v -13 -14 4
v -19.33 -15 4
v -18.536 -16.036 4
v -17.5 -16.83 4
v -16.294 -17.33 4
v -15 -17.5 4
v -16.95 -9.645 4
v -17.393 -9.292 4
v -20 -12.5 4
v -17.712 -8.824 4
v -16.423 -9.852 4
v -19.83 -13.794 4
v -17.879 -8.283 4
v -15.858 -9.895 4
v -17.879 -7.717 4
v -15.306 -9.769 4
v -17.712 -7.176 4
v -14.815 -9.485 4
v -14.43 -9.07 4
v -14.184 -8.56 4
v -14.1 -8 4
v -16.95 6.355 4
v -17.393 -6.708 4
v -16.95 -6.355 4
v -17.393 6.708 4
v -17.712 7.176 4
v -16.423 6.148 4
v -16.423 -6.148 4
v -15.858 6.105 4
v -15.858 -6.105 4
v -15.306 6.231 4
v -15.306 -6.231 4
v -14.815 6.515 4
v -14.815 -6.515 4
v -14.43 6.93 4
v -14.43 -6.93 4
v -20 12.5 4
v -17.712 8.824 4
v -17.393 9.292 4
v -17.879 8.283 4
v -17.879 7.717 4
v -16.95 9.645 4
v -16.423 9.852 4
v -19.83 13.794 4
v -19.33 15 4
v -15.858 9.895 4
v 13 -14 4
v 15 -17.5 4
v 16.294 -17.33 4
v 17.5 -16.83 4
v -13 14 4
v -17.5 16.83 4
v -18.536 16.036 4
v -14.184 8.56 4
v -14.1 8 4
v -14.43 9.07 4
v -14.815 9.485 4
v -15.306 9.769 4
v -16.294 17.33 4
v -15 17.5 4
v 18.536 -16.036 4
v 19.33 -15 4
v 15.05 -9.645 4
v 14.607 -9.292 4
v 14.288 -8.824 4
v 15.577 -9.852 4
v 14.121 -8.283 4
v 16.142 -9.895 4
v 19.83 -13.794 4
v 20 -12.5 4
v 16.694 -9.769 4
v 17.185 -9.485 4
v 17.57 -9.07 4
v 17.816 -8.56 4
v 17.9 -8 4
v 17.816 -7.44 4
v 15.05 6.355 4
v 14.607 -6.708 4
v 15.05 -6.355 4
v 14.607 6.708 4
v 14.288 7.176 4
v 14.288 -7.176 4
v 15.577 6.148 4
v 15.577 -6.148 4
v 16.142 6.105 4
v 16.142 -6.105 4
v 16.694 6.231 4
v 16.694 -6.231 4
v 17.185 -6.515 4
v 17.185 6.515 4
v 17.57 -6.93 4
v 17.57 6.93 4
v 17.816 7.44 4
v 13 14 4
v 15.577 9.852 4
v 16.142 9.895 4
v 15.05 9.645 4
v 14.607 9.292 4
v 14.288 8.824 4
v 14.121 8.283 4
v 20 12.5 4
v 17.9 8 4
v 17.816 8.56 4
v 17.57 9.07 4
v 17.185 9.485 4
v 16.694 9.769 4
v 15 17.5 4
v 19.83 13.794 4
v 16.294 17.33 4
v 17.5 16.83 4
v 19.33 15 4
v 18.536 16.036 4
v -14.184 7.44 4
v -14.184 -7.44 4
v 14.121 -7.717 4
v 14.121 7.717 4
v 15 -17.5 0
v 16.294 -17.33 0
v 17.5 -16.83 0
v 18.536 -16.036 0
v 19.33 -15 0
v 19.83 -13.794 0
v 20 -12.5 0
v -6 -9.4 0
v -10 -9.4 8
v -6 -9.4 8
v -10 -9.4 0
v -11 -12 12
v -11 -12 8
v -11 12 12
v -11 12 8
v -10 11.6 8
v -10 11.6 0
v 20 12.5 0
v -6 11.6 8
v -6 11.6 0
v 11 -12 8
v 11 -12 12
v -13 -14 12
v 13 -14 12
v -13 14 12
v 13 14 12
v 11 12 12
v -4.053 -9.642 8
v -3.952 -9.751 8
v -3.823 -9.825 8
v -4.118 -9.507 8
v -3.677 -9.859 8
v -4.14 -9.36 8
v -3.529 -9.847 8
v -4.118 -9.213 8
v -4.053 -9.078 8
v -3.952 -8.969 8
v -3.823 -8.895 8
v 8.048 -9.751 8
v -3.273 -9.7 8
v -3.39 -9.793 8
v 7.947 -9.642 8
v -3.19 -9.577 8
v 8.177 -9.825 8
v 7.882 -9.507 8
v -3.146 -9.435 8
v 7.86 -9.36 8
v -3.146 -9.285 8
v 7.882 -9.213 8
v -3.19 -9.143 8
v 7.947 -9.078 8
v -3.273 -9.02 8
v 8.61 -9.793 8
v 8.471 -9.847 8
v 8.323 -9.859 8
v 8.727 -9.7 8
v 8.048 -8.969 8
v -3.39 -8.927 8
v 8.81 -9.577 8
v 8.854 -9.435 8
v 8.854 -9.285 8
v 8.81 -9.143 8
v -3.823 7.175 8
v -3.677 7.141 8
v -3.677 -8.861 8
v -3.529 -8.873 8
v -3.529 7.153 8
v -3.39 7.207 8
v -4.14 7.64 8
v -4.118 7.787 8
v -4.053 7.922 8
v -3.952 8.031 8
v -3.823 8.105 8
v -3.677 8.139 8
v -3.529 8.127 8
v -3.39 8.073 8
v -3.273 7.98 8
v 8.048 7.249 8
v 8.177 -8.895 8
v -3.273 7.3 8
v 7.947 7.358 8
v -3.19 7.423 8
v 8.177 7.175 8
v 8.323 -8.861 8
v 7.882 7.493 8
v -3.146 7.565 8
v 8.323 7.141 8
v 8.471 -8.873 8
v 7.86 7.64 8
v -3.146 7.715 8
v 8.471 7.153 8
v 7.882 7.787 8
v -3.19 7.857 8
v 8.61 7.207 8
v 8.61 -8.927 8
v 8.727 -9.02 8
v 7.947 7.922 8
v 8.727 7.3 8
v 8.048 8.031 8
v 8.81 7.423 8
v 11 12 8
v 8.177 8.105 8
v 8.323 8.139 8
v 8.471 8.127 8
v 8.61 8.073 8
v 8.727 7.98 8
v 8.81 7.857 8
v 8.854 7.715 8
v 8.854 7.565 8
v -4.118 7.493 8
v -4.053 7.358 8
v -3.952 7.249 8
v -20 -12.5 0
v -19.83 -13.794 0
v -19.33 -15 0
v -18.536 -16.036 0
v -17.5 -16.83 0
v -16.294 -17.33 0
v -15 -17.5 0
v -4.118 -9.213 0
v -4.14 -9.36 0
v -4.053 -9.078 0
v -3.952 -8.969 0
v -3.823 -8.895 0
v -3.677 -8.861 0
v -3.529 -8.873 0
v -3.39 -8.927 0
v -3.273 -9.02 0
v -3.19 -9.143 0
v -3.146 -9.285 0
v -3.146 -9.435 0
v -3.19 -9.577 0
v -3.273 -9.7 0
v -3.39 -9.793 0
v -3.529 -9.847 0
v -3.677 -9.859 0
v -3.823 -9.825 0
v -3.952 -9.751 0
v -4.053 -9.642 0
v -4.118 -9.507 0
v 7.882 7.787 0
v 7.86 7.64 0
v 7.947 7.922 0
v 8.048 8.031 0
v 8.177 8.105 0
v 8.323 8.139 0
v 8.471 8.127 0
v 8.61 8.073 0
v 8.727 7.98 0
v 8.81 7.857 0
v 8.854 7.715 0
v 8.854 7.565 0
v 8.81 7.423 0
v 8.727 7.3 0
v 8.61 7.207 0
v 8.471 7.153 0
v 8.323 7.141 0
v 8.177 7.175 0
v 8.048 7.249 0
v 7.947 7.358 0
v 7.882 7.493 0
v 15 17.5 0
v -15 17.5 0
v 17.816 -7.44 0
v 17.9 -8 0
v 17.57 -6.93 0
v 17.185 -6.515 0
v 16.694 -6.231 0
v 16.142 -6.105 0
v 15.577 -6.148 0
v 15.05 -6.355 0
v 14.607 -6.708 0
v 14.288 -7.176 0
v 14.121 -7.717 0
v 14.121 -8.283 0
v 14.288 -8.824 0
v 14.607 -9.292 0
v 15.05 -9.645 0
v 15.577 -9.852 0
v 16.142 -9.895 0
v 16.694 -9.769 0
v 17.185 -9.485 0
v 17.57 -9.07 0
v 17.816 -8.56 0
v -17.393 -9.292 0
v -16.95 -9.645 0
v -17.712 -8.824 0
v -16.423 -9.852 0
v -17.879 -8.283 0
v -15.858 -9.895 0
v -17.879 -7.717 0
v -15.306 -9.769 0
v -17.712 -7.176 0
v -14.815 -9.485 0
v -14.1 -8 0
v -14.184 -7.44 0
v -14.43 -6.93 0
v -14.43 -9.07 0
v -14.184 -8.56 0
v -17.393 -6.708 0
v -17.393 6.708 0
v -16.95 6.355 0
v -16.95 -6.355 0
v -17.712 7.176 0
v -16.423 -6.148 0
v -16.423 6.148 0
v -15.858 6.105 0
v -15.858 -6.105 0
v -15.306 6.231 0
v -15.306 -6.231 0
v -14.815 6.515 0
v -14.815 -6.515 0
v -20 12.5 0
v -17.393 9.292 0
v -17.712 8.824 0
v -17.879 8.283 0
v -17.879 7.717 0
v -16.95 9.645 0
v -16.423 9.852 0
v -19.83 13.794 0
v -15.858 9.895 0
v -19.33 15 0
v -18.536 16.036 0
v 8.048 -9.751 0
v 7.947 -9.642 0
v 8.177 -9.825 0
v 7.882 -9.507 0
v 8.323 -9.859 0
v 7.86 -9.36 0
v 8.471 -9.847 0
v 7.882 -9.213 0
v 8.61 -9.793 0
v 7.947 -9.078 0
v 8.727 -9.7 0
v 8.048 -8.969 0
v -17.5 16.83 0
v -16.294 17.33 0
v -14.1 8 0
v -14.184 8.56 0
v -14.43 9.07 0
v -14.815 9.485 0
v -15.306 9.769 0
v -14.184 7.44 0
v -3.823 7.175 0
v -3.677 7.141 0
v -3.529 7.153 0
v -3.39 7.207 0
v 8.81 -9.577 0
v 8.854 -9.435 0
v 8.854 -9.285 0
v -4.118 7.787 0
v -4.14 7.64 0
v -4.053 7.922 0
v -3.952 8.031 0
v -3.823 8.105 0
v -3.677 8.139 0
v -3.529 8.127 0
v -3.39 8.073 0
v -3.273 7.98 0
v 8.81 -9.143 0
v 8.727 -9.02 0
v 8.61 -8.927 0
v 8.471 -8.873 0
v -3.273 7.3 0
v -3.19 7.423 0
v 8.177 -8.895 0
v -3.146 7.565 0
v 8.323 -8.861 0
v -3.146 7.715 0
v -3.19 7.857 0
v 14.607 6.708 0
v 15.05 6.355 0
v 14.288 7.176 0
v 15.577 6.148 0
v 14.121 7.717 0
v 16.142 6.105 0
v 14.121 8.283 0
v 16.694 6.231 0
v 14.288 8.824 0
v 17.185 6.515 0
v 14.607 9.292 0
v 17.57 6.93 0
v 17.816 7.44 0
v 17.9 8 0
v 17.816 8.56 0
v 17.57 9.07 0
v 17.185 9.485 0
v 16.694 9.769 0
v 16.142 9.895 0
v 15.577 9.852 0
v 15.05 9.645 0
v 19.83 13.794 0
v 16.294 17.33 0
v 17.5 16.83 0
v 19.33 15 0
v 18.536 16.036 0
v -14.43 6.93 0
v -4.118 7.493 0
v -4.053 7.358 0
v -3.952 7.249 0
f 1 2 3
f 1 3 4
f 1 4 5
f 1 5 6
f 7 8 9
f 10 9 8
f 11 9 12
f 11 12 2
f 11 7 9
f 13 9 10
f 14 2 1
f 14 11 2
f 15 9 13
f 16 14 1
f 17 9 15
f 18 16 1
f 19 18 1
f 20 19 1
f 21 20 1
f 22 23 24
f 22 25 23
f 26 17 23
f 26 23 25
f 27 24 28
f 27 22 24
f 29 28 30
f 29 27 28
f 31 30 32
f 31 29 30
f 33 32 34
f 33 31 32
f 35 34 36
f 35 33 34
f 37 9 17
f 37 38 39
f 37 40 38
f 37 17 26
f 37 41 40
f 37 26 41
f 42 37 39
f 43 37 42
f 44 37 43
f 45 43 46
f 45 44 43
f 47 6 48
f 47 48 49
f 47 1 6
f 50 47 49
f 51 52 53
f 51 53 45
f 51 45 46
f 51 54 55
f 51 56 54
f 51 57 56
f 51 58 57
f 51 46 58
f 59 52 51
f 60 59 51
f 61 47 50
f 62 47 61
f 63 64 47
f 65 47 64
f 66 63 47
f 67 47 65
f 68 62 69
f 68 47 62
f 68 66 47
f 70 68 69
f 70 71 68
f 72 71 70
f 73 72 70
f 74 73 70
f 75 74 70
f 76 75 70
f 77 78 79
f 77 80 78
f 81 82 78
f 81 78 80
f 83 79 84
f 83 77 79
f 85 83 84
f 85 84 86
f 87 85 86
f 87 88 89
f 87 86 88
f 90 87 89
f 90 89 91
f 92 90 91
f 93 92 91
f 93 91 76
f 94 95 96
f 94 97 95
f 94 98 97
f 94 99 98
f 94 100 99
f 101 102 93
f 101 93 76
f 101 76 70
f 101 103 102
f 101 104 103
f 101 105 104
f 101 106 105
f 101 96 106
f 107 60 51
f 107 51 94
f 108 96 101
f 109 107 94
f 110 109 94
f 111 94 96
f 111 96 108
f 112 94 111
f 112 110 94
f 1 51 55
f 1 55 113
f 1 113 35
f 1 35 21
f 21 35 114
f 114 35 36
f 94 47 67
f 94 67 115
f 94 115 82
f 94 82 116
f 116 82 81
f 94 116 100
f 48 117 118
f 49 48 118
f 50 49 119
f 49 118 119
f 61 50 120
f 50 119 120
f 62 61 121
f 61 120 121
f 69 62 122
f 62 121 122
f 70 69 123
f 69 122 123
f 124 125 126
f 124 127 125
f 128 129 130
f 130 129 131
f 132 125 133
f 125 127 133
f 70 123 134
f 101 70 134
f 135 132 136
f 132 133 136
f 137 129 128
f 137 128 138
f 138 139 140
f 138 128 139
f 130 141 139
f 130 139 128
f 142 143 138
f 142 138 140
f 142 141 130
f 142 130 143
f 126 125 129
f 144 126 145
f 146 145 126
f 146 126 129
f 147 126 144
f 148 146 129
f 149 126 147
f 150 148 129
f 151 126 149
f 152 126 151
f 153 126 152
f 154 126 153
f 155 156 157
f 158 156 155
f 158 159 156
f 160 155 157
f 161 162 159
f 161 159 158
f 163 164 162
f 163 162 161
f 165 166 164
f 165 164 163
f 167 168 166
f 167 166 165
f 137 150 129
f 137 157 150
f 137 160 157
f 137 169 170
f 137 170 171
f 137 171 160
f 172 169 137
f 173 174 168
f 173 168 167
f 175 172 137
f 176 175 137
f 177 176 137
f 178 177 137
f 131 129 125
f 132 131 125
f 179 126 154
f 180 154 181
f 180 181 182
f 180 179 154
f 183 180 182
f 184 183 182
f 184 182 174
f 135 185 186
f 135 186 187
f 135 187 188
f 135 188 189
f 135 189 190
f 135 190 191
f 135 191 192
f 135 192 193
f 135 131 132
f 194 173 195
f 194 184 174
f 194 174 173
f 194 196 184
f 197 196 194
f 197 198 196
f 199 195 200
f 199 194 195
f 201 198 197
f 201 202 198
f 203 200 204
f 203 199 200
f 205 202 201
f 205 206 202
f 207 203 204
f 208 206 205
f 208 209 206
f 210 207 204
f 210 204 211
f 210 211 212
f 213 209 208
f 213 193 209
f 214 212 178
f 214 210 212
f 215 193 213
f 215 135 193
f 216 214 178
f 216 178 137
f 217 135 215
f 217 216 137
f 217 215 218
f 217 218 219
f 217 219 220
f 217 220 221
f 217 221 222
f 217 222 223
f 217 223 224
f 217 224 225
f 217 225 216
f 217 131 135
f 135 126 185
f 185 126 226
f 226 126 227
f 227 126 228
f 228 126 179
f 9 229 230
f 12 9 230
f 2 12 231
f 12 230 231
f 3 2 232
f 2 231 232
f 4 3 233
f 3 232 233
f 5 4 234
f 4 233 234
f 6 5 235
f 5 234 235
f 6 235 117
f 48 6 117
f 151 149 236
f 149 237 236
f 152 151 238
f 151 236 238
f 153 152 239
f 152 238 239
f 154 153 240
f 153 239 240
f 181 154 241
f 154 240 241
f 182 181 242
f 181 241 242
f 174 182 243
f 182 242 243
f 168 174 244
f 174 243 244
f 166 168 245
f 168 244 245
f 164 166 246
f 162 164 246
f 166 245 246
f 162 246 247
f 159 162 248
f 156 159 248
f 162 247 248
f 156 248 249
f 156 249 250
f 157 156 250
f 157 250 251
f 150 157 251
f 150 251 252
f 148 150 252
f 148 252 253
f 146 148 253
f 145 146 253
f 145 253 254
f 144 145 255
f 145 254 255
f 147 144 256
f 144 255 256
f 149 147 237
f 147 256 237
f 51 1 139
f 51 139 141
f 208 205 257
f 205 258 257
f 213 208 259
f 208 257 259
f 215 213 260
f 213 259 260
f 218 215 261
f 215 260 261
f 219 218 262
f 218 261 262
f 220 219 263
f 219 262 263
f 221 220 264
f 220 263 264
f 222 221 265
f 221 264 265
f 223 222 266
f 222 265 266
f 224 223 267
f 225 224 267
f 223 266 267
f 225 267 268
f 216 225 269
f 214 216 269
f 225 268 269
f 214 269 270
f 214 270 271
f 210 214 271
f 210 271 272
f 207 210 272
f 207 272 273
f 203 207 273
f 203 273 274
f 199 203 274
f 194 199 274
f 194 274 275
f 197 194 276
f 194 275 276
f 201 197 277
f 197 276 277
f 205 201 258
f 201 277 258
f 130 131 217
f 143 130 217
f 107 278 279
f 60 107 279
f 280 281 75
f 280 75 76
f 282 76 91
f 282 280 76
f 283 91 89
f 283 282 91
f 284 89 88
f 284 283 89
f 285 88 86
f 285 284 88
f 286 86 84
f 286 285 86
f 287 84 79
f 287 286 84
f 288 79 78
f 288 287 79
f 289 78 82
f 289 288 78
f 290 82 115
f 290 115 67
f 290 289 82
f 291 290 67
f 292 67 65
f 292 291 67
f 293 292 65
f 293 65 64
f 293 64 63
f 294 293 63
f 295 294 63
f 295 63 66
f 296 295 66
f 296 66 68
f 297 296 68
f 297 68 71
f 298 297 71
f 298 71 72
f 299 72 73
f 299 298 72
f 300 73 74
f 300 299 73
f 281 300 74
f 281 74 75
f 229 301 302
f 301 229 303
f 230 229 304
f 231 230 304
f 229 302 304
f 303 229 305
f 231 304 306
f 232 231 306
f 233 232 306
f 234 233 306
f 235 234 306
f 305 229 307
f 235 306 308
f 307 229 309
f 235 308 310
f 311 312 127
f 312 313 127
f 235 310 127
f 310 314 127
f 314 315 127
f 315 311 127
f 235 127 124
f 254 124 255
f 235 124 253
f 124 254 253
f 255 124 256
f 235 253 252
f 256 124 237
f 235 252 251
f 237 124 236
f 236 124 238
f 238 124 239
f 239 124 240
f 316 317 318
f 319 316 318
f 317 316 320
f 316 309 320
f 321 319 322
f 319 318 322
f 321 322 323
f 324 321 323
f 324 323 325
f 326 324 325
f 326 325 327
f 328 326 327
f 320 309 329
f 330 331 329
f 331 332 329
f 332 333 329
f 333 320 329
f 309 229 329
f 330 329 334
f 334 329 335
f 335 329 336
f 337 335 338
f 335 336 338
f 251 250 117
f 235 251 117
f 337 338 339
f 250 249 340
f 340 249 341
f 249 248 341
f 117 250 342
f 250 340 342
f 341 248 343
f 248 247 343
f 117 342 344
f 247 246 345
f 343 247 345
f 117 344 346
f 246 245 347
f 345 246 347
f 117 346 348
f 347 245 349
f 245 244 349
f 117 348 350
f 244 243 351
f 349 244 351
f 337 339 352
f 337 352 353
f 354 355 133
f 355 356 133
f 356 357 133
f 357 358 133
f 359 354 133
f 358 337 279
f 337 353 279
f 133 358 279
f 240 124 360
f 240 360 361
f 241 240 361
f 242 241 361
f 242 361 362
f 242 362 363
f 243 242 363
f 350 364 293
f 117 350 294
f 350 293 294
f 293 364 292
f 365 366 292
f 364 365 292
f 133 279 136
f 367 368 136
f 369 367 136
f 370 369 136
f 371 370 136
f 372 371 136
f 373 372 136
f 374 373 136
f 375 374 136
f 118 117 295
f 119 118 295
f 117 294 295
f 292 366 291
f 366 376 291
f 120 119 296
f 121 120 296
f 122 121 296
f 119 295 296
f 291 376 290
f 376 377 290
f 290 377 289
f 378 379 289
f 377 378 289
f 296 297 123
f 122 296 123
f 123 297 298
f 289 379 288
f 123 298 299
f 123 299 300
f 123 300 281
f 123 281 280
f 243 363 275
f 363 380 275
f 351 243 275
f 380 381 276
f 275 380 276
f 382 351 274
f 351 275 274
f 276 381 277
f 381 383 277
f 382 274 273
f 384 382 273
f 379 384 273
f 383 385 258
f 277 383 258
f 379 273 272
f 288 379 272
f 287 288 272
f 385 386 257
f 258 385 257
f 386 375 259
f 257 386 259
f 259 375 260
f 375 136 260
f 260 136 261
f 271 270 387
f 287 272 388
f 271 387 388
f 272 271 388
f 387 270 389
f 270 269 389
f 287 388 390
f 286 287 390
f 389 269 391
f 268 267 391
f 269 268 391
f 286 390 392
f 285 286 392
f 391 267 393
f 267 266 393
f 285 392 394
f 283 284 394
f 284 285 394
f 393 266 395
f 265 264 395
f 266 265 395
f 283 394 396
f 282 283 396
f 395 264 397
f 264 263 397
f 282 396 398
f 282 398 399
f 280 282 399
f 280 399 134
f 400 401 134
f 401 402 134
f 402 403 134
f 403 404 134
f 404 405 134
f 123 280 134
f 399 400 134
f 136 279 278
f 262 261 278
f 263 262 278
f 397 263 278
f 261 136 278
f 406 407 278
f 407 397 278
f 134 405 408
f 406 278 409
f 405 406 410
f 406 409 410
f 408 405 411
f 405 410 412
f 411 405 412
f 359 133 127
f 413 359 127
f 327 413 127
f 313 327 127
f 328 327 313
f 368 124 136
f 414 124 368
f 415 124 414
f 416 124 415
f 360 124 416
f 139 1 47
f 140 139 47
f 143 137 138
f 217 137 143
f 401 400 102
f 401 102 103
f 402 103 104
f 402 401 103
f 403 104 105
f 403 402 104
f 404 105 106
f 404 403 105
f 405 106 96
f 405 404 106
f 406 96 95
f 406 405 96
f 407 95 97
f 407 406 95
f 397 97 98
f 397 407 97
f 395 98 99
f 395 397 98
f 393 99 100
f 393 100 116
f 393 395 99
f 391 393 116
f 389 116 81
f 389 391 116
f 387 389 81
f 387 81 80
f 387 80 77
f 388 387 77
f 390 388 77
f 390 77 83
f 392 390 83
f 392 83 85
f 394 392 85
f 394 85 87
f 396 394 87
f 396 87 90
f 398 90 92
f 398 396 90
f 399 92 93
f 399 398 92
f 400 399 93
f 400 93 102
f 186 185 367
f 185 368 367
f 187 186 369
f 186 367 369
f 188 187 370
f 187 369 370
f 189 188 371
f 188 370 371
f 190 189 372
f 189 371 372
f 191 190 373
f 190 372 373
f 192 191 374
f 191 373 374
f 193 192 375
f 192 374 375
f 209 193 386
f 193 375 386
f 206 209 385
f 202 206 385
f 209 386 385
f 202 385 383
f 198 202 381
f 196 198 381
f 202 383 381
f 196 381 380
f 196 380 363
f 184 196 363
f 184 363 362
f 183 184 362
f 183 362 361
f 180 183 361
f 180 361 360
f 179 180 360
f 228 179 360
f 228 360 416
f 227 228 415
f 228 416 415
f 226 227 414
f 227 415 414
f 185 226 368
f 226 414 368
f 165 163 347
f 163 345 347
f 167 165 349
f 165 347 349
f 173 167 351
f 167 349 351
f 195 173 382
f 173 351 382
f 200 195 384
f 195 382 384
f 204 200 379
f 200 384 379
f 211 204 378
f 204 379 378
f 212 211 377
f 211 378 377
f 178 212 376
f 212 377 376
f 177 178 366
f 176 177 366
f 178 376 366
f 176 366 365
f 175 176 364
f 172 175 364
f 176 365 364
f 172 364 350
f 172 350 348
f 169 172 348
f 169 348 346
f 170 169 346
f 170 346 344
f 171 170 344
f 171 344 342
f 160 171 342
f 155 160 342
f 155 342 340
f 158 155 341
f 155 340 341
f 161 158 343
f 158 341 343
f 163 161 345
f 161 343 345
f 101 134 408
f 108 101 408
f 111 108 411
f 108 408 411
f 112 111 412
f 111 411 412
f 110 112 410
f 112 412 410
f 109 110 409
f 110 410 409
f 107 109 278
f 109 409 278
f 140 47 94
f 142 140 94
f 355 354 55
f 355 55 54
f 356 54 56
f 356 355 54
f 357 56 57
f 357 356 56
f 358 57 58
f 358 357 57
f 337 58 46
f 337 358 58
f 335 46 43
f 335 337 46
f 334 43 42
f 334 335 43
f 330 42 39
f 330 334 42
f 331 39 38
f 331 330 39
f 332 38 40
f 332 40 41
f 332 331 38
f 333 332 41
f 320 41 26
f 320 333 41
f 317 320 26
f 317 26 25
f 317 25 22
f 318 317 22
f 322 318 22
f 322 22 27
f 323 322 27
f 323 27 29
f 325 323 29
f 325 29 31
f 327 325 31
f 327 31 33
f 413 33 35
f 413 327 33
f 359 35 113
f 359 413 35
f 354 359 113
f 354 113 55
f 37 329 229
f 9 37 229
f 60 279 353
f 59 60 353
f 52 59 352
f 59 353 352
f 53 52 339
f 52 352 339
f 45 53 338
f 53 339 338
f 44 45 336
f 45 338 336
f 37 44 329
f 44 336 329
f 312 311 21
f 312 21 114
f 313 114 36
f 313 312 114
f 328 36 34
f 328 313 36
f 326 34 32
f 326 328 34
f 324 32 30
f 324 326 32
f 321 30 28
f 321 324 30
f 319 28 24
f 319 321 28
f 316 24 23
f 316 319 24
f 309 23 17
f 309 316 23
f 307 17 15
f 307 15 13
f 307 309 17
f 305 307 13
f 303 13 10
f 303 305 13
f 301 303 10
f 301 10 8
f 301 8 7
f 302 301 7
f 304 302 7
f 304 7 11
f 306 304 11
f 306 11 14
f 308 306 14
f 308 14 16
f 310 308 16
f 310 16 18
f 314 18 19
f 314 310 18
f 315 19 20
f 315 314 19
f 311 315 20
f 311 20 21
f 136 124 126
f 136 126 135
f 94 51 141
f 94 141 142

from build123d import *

# Parameters (mm, degrees)
F0_R     = 1.9
F0_W     = 4
F0_H     = 21
F1_DEPTH = 4
F2_W     = 26
F2_H     = 28
F2_W_2   = 22
F2_H_2   = 24
F3_DEPTH = 8
F5_D     = 1
F6_DEPTH = 4


with BuildPart() as f1:
    # F0 (on Top) → F1 (new body)
    with BuildSketch(Plane.XY):
        with BuildLine():
            ThreePointArc((20, 12.5), (18.5355339059, 16.0355339059), (15, 17.5))
            Line((15, 17.5), (-15, 17.5))
            ThreePointArc((-15, 17.5), (-18.5355339059, 16.0355339059), (-20, 12.5))
            Line((-20, 12.5), (-20, -12.5))
            ThreePointArc((-20, -12.5), (-18.5355339059, -16.0355339059), (-15, -17.5))
            Line((-15, -17.5), (15, -17.5))
            ThreePointArc((15, -17.5), (18.5355339059, -16.0355339059), (20, -12.5))
            Line((20, -12.5), (20, 12.5))
        make_face()
        with Locations((-16, -8)):
            Circle(F0_R, mode=Mode.SUBTRACT)
        with Locations((16, -8)):
            Circle(F0_R, mode=Mode.SUBTRACT)
        with Locations((-16, 8)):
            Circle(F0_R, mode=Mode.SUBTRACT)
        with Locations((-8, 1.1)):
            Rectangle(F0_W, F0_H, mode=Mode.SUBTRACT)
        with Locations((16, 8)):
            Circle(F0_R, mode=Mode.SUBTRACT)
    extrude(amount=F1_DEPTH)

    # F2 (on face) → F3 (join)
    with BuildSketch(Plane.XY.offset(4)):
        Rectangle(F2_W, F2_H)
        Rectangle(F2_W_2, F2_H_2, mode=Mode.SUBTRACT)
    extrude(amount=F3_DEPTH)

    # F5 (through all)
    with Locations(Plane.XY.offset(4)):
        with Locations((-3.64, -9.36), (8.36, -9.36), (8.36, 7.64), (-3.64, 7.64)):
            Hole(F5_D / 2)

    # F6 (add): a face of the model
    f6_faces = [f1.faces().sort_by_distance(p)[0] for p in [
        (1.5074813824, -0.2034626738, 4),
    ]]
    extrude(f6_faces, amount=F6_DEPTH)


solid = f1.part
